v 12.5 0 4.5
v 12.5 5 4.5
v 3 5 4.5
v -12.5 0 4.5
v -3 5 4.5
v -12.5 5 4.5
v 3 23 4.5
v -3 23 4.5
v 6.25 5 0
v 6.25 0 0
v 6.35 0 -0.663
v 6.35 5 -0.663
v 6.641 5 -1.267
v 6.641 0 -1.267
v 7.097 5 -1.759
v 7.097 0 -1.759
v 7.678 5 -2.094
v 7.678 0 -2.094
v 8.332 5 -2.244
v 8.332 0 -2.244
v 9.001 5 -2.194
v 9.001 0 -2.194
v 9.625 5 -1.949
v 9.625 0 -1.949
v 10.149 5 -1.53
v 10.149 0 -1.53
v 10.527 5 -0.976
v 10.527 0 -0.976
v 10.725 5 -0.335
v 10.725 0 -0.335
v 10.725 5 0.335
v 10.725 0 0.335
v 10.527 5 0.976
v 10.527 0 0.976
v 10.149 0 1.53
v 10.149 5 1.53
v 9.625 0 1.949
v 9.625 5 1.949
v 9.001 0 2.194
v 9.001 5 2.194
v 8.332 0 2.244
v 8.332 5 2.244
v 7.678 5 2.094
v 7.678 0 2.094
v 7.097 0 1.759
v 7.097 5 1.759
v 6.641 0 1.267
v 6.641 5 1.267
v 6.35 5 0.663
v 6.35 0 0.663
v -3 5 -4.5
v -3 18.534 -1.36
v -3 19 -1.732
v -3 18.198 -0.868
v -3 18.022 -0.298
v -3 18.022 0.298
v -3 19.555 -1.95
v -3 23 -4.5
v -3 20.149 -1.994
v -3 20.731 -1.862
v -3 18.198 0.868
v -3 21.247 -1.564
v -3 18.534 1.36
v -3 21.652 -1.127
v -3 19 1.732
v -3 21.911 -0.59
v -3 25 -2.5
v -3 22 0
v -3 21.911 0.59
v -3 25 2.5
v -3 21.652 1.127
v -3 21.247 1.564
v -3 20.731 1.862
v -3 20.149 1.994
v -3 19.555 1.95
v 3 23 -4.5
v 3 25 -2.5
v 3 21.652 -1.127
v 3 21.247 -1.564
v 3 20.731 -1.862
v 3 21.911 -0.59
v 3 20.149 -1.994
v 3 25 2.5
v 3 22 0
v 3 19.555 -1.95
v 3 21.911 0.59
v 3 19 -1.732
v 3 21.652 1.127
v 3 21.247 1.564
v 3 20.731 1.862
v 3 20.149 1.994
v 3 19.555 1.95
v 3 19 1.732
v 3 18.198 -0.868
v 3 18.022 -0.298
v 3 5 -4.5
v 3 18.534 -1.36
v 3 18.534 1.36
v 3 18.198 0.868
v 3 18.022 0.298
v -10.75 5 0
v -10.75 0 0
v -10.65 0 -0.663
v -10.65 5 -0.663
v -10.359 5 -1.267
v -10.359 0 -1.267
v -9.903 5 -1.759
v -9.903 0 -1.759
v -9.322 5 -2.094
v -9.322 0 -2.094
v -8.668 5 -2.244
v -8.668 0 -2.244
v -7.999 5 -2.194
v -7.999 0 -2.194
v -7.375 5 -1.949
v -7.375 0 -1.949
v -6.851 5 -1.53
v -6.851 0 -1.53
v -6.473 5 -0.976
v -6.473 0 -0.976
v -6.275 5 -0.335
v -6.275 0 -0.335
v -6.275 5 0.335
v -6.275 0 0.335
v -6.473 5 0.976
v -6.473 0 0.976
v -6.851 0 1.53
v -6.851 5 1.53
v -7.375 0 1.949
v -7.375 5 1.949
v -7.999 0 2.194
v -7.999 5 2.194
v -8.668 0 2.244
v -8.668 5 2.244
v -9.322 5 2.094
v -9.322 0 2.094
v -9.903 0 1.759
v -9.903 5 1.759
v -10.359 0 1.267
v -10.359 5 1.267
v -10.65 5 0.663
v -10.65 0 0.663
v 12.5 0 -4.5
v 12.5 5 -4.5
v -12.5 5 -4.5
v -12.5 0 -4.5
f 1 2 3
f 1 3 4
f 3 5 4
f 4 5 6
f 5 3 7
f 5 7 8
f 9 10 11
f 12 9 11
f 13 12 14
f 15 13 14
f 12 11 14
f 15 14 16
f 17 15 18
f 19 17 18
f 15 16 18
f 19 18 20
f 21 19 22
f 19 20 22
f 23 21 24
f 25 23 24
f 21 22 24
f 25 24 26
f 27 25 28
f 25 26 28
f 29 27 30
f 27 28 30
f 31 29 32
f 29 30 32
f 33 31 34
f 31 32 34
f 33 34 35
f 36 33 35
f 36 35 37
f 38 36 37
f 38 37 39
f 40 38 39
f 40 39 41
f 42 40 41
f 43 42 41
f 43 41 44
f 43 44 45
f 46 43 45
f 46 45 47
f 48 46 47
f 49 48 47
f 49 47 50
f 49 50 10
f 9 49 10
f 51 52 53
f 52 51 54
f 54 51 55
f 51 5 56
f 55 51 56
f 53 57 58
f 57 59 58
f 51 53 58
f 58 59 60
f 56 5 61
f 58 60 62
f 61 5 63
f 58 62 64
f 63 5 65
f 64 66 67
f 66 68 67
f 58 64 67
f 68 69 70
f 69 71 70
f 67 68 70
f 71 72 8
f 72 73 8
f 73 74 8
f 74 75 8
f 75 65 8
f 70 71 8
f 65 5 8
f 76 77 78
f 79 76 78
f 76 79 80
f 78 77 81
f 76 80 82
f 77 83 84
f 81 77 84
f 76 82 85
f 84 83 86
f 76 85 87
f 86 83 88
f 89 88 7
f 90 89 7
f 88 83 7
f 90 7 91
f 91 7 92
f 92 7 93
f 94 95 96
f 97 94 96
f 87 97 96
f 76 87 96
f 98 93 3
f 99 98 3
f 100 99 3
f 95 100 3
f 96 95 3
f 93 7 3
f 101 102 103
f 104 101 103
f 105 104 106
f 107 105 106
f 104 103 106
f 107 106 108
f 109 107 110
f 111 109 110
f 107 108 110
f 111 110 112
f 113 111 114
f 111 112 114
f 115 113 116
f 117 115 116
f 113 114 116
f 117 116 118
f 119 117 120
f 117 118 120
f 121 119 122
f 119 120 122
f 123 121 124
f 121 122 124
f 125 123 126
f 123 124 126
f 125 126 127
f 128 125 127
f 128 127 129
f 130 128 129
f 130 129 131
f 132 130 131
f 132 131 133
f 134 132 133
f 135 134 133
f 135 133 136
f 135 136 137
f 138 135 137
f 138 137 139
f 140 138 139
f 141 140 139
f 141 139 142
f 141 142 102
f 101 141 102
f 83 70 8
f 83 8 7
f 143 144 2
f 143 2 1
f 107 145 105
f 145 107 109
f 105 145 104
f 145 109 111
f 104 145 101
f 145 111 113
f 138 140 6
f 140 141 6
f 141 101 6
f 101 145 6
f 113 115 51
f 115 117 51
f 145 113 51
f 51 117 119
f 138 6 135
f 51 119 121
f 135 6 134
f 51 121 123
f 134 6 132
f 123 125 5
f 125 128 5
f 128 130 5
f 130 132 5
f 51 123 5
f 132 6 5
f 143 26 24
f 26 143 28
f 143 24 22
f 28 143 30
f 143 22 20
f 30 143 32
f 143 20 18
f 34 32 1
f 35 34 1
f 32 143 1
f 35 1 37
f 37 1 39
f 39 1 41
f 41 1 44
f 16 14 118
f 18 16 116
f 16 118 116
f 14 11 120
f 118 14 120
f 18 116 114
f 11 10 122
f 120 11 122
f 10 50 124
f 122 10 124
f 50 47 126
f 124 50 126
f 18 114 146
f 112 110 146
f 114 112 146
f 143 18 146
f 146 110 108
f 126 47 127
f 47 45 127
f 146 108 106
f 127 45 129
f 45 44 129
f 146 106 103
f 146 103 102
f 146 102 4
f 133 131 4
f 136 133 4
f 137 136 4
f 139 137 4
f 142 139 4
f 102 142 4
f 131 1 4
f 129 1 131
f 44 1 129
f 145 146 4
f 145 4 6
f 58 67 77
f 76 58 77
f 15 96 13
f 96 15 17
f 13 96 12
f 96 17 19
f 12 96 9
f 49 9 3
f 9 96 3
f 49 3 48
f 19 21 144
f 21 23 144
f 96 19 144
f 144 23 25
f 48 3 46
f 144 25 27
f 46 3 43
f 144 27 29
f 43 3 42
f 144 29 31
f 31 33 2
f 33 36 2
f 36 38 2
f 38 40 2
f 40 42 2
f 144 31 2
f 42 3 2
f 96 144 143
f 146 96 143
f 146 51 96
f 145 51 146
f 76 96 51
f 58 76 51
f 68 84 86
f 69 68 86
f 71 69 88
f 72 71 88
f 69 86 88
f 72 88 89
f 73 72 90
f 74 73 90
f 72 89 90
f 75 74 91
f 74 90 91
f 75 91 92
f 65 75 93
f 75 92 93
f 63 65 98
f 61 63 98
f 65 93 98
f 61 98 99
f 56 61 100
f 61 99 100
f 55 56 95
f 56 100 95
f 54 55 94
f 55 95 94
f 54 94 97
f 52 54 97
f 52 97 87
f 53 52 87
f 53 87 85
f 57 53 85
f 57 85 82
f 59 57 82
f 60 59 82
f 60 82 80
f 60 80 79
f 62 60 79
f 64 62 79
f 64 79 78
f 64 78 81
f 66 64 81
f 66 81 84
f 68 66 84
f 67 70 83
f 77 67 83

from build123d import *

# Parameters (mm, degrees)
BOSS_EXTRUDE1_DEPTH = 4.5
DIAMETER_HOLE1_D    = 4.5
CHAMFER1_SIZE       = 2
SKETCH4_R           = 2
CUT_EXTRUDE1_DEPTH  = 30.757352033


with BuildPart() as part:
    # Sketch1 → Boss-Extrude1 (new, symmetric)
    with BuildSketch(Plane.XY):
        Polygon((12.5, 0), (-12.5, 0), (-12.5, 5), (-3, 5), (-3, 25), (3, 25), (3, 5), (12.5, 5), align=None)
    extrude(amount=BOSS_EXTRUDE1_DEPTH, both=True)

    # Diameter Hole1 (through all)
    with Locations(Plane(origin=(0, 5, 0), x_dir=(1, 0, 0), z_dir=(0, 1, 0))):
        with Locations((-8.5, 0), (8.5, 0)):
            Hole(DIAMETER_HOLE1_D / 2)

    # Chamfer1
    chamfer1_edges = [part.edges().sort_by_distance(p)[0] for p in [
        (0, 25, 4.5),
        (0, 25, -4.5),
    ]]
    chamfer(chamfer1_edges, length=CHAMFER1_SIZE)

    # Sketch4 → Cut-Extrude1 (cut, through all)
    with BuildSketch(Plane(origin=(3, 0, 0), x_dir=(0, 0, -1), z_dir=(1, 0, 0))):
        with Locations(Location((0, 20, 0), (0, 0, 90))):
            Circle(SKETCH4_R)
    extrude(amount=-CUT_EXTRUDE1_DEPTH, mode=Mode.SUBTRACT)


solid = part.part
